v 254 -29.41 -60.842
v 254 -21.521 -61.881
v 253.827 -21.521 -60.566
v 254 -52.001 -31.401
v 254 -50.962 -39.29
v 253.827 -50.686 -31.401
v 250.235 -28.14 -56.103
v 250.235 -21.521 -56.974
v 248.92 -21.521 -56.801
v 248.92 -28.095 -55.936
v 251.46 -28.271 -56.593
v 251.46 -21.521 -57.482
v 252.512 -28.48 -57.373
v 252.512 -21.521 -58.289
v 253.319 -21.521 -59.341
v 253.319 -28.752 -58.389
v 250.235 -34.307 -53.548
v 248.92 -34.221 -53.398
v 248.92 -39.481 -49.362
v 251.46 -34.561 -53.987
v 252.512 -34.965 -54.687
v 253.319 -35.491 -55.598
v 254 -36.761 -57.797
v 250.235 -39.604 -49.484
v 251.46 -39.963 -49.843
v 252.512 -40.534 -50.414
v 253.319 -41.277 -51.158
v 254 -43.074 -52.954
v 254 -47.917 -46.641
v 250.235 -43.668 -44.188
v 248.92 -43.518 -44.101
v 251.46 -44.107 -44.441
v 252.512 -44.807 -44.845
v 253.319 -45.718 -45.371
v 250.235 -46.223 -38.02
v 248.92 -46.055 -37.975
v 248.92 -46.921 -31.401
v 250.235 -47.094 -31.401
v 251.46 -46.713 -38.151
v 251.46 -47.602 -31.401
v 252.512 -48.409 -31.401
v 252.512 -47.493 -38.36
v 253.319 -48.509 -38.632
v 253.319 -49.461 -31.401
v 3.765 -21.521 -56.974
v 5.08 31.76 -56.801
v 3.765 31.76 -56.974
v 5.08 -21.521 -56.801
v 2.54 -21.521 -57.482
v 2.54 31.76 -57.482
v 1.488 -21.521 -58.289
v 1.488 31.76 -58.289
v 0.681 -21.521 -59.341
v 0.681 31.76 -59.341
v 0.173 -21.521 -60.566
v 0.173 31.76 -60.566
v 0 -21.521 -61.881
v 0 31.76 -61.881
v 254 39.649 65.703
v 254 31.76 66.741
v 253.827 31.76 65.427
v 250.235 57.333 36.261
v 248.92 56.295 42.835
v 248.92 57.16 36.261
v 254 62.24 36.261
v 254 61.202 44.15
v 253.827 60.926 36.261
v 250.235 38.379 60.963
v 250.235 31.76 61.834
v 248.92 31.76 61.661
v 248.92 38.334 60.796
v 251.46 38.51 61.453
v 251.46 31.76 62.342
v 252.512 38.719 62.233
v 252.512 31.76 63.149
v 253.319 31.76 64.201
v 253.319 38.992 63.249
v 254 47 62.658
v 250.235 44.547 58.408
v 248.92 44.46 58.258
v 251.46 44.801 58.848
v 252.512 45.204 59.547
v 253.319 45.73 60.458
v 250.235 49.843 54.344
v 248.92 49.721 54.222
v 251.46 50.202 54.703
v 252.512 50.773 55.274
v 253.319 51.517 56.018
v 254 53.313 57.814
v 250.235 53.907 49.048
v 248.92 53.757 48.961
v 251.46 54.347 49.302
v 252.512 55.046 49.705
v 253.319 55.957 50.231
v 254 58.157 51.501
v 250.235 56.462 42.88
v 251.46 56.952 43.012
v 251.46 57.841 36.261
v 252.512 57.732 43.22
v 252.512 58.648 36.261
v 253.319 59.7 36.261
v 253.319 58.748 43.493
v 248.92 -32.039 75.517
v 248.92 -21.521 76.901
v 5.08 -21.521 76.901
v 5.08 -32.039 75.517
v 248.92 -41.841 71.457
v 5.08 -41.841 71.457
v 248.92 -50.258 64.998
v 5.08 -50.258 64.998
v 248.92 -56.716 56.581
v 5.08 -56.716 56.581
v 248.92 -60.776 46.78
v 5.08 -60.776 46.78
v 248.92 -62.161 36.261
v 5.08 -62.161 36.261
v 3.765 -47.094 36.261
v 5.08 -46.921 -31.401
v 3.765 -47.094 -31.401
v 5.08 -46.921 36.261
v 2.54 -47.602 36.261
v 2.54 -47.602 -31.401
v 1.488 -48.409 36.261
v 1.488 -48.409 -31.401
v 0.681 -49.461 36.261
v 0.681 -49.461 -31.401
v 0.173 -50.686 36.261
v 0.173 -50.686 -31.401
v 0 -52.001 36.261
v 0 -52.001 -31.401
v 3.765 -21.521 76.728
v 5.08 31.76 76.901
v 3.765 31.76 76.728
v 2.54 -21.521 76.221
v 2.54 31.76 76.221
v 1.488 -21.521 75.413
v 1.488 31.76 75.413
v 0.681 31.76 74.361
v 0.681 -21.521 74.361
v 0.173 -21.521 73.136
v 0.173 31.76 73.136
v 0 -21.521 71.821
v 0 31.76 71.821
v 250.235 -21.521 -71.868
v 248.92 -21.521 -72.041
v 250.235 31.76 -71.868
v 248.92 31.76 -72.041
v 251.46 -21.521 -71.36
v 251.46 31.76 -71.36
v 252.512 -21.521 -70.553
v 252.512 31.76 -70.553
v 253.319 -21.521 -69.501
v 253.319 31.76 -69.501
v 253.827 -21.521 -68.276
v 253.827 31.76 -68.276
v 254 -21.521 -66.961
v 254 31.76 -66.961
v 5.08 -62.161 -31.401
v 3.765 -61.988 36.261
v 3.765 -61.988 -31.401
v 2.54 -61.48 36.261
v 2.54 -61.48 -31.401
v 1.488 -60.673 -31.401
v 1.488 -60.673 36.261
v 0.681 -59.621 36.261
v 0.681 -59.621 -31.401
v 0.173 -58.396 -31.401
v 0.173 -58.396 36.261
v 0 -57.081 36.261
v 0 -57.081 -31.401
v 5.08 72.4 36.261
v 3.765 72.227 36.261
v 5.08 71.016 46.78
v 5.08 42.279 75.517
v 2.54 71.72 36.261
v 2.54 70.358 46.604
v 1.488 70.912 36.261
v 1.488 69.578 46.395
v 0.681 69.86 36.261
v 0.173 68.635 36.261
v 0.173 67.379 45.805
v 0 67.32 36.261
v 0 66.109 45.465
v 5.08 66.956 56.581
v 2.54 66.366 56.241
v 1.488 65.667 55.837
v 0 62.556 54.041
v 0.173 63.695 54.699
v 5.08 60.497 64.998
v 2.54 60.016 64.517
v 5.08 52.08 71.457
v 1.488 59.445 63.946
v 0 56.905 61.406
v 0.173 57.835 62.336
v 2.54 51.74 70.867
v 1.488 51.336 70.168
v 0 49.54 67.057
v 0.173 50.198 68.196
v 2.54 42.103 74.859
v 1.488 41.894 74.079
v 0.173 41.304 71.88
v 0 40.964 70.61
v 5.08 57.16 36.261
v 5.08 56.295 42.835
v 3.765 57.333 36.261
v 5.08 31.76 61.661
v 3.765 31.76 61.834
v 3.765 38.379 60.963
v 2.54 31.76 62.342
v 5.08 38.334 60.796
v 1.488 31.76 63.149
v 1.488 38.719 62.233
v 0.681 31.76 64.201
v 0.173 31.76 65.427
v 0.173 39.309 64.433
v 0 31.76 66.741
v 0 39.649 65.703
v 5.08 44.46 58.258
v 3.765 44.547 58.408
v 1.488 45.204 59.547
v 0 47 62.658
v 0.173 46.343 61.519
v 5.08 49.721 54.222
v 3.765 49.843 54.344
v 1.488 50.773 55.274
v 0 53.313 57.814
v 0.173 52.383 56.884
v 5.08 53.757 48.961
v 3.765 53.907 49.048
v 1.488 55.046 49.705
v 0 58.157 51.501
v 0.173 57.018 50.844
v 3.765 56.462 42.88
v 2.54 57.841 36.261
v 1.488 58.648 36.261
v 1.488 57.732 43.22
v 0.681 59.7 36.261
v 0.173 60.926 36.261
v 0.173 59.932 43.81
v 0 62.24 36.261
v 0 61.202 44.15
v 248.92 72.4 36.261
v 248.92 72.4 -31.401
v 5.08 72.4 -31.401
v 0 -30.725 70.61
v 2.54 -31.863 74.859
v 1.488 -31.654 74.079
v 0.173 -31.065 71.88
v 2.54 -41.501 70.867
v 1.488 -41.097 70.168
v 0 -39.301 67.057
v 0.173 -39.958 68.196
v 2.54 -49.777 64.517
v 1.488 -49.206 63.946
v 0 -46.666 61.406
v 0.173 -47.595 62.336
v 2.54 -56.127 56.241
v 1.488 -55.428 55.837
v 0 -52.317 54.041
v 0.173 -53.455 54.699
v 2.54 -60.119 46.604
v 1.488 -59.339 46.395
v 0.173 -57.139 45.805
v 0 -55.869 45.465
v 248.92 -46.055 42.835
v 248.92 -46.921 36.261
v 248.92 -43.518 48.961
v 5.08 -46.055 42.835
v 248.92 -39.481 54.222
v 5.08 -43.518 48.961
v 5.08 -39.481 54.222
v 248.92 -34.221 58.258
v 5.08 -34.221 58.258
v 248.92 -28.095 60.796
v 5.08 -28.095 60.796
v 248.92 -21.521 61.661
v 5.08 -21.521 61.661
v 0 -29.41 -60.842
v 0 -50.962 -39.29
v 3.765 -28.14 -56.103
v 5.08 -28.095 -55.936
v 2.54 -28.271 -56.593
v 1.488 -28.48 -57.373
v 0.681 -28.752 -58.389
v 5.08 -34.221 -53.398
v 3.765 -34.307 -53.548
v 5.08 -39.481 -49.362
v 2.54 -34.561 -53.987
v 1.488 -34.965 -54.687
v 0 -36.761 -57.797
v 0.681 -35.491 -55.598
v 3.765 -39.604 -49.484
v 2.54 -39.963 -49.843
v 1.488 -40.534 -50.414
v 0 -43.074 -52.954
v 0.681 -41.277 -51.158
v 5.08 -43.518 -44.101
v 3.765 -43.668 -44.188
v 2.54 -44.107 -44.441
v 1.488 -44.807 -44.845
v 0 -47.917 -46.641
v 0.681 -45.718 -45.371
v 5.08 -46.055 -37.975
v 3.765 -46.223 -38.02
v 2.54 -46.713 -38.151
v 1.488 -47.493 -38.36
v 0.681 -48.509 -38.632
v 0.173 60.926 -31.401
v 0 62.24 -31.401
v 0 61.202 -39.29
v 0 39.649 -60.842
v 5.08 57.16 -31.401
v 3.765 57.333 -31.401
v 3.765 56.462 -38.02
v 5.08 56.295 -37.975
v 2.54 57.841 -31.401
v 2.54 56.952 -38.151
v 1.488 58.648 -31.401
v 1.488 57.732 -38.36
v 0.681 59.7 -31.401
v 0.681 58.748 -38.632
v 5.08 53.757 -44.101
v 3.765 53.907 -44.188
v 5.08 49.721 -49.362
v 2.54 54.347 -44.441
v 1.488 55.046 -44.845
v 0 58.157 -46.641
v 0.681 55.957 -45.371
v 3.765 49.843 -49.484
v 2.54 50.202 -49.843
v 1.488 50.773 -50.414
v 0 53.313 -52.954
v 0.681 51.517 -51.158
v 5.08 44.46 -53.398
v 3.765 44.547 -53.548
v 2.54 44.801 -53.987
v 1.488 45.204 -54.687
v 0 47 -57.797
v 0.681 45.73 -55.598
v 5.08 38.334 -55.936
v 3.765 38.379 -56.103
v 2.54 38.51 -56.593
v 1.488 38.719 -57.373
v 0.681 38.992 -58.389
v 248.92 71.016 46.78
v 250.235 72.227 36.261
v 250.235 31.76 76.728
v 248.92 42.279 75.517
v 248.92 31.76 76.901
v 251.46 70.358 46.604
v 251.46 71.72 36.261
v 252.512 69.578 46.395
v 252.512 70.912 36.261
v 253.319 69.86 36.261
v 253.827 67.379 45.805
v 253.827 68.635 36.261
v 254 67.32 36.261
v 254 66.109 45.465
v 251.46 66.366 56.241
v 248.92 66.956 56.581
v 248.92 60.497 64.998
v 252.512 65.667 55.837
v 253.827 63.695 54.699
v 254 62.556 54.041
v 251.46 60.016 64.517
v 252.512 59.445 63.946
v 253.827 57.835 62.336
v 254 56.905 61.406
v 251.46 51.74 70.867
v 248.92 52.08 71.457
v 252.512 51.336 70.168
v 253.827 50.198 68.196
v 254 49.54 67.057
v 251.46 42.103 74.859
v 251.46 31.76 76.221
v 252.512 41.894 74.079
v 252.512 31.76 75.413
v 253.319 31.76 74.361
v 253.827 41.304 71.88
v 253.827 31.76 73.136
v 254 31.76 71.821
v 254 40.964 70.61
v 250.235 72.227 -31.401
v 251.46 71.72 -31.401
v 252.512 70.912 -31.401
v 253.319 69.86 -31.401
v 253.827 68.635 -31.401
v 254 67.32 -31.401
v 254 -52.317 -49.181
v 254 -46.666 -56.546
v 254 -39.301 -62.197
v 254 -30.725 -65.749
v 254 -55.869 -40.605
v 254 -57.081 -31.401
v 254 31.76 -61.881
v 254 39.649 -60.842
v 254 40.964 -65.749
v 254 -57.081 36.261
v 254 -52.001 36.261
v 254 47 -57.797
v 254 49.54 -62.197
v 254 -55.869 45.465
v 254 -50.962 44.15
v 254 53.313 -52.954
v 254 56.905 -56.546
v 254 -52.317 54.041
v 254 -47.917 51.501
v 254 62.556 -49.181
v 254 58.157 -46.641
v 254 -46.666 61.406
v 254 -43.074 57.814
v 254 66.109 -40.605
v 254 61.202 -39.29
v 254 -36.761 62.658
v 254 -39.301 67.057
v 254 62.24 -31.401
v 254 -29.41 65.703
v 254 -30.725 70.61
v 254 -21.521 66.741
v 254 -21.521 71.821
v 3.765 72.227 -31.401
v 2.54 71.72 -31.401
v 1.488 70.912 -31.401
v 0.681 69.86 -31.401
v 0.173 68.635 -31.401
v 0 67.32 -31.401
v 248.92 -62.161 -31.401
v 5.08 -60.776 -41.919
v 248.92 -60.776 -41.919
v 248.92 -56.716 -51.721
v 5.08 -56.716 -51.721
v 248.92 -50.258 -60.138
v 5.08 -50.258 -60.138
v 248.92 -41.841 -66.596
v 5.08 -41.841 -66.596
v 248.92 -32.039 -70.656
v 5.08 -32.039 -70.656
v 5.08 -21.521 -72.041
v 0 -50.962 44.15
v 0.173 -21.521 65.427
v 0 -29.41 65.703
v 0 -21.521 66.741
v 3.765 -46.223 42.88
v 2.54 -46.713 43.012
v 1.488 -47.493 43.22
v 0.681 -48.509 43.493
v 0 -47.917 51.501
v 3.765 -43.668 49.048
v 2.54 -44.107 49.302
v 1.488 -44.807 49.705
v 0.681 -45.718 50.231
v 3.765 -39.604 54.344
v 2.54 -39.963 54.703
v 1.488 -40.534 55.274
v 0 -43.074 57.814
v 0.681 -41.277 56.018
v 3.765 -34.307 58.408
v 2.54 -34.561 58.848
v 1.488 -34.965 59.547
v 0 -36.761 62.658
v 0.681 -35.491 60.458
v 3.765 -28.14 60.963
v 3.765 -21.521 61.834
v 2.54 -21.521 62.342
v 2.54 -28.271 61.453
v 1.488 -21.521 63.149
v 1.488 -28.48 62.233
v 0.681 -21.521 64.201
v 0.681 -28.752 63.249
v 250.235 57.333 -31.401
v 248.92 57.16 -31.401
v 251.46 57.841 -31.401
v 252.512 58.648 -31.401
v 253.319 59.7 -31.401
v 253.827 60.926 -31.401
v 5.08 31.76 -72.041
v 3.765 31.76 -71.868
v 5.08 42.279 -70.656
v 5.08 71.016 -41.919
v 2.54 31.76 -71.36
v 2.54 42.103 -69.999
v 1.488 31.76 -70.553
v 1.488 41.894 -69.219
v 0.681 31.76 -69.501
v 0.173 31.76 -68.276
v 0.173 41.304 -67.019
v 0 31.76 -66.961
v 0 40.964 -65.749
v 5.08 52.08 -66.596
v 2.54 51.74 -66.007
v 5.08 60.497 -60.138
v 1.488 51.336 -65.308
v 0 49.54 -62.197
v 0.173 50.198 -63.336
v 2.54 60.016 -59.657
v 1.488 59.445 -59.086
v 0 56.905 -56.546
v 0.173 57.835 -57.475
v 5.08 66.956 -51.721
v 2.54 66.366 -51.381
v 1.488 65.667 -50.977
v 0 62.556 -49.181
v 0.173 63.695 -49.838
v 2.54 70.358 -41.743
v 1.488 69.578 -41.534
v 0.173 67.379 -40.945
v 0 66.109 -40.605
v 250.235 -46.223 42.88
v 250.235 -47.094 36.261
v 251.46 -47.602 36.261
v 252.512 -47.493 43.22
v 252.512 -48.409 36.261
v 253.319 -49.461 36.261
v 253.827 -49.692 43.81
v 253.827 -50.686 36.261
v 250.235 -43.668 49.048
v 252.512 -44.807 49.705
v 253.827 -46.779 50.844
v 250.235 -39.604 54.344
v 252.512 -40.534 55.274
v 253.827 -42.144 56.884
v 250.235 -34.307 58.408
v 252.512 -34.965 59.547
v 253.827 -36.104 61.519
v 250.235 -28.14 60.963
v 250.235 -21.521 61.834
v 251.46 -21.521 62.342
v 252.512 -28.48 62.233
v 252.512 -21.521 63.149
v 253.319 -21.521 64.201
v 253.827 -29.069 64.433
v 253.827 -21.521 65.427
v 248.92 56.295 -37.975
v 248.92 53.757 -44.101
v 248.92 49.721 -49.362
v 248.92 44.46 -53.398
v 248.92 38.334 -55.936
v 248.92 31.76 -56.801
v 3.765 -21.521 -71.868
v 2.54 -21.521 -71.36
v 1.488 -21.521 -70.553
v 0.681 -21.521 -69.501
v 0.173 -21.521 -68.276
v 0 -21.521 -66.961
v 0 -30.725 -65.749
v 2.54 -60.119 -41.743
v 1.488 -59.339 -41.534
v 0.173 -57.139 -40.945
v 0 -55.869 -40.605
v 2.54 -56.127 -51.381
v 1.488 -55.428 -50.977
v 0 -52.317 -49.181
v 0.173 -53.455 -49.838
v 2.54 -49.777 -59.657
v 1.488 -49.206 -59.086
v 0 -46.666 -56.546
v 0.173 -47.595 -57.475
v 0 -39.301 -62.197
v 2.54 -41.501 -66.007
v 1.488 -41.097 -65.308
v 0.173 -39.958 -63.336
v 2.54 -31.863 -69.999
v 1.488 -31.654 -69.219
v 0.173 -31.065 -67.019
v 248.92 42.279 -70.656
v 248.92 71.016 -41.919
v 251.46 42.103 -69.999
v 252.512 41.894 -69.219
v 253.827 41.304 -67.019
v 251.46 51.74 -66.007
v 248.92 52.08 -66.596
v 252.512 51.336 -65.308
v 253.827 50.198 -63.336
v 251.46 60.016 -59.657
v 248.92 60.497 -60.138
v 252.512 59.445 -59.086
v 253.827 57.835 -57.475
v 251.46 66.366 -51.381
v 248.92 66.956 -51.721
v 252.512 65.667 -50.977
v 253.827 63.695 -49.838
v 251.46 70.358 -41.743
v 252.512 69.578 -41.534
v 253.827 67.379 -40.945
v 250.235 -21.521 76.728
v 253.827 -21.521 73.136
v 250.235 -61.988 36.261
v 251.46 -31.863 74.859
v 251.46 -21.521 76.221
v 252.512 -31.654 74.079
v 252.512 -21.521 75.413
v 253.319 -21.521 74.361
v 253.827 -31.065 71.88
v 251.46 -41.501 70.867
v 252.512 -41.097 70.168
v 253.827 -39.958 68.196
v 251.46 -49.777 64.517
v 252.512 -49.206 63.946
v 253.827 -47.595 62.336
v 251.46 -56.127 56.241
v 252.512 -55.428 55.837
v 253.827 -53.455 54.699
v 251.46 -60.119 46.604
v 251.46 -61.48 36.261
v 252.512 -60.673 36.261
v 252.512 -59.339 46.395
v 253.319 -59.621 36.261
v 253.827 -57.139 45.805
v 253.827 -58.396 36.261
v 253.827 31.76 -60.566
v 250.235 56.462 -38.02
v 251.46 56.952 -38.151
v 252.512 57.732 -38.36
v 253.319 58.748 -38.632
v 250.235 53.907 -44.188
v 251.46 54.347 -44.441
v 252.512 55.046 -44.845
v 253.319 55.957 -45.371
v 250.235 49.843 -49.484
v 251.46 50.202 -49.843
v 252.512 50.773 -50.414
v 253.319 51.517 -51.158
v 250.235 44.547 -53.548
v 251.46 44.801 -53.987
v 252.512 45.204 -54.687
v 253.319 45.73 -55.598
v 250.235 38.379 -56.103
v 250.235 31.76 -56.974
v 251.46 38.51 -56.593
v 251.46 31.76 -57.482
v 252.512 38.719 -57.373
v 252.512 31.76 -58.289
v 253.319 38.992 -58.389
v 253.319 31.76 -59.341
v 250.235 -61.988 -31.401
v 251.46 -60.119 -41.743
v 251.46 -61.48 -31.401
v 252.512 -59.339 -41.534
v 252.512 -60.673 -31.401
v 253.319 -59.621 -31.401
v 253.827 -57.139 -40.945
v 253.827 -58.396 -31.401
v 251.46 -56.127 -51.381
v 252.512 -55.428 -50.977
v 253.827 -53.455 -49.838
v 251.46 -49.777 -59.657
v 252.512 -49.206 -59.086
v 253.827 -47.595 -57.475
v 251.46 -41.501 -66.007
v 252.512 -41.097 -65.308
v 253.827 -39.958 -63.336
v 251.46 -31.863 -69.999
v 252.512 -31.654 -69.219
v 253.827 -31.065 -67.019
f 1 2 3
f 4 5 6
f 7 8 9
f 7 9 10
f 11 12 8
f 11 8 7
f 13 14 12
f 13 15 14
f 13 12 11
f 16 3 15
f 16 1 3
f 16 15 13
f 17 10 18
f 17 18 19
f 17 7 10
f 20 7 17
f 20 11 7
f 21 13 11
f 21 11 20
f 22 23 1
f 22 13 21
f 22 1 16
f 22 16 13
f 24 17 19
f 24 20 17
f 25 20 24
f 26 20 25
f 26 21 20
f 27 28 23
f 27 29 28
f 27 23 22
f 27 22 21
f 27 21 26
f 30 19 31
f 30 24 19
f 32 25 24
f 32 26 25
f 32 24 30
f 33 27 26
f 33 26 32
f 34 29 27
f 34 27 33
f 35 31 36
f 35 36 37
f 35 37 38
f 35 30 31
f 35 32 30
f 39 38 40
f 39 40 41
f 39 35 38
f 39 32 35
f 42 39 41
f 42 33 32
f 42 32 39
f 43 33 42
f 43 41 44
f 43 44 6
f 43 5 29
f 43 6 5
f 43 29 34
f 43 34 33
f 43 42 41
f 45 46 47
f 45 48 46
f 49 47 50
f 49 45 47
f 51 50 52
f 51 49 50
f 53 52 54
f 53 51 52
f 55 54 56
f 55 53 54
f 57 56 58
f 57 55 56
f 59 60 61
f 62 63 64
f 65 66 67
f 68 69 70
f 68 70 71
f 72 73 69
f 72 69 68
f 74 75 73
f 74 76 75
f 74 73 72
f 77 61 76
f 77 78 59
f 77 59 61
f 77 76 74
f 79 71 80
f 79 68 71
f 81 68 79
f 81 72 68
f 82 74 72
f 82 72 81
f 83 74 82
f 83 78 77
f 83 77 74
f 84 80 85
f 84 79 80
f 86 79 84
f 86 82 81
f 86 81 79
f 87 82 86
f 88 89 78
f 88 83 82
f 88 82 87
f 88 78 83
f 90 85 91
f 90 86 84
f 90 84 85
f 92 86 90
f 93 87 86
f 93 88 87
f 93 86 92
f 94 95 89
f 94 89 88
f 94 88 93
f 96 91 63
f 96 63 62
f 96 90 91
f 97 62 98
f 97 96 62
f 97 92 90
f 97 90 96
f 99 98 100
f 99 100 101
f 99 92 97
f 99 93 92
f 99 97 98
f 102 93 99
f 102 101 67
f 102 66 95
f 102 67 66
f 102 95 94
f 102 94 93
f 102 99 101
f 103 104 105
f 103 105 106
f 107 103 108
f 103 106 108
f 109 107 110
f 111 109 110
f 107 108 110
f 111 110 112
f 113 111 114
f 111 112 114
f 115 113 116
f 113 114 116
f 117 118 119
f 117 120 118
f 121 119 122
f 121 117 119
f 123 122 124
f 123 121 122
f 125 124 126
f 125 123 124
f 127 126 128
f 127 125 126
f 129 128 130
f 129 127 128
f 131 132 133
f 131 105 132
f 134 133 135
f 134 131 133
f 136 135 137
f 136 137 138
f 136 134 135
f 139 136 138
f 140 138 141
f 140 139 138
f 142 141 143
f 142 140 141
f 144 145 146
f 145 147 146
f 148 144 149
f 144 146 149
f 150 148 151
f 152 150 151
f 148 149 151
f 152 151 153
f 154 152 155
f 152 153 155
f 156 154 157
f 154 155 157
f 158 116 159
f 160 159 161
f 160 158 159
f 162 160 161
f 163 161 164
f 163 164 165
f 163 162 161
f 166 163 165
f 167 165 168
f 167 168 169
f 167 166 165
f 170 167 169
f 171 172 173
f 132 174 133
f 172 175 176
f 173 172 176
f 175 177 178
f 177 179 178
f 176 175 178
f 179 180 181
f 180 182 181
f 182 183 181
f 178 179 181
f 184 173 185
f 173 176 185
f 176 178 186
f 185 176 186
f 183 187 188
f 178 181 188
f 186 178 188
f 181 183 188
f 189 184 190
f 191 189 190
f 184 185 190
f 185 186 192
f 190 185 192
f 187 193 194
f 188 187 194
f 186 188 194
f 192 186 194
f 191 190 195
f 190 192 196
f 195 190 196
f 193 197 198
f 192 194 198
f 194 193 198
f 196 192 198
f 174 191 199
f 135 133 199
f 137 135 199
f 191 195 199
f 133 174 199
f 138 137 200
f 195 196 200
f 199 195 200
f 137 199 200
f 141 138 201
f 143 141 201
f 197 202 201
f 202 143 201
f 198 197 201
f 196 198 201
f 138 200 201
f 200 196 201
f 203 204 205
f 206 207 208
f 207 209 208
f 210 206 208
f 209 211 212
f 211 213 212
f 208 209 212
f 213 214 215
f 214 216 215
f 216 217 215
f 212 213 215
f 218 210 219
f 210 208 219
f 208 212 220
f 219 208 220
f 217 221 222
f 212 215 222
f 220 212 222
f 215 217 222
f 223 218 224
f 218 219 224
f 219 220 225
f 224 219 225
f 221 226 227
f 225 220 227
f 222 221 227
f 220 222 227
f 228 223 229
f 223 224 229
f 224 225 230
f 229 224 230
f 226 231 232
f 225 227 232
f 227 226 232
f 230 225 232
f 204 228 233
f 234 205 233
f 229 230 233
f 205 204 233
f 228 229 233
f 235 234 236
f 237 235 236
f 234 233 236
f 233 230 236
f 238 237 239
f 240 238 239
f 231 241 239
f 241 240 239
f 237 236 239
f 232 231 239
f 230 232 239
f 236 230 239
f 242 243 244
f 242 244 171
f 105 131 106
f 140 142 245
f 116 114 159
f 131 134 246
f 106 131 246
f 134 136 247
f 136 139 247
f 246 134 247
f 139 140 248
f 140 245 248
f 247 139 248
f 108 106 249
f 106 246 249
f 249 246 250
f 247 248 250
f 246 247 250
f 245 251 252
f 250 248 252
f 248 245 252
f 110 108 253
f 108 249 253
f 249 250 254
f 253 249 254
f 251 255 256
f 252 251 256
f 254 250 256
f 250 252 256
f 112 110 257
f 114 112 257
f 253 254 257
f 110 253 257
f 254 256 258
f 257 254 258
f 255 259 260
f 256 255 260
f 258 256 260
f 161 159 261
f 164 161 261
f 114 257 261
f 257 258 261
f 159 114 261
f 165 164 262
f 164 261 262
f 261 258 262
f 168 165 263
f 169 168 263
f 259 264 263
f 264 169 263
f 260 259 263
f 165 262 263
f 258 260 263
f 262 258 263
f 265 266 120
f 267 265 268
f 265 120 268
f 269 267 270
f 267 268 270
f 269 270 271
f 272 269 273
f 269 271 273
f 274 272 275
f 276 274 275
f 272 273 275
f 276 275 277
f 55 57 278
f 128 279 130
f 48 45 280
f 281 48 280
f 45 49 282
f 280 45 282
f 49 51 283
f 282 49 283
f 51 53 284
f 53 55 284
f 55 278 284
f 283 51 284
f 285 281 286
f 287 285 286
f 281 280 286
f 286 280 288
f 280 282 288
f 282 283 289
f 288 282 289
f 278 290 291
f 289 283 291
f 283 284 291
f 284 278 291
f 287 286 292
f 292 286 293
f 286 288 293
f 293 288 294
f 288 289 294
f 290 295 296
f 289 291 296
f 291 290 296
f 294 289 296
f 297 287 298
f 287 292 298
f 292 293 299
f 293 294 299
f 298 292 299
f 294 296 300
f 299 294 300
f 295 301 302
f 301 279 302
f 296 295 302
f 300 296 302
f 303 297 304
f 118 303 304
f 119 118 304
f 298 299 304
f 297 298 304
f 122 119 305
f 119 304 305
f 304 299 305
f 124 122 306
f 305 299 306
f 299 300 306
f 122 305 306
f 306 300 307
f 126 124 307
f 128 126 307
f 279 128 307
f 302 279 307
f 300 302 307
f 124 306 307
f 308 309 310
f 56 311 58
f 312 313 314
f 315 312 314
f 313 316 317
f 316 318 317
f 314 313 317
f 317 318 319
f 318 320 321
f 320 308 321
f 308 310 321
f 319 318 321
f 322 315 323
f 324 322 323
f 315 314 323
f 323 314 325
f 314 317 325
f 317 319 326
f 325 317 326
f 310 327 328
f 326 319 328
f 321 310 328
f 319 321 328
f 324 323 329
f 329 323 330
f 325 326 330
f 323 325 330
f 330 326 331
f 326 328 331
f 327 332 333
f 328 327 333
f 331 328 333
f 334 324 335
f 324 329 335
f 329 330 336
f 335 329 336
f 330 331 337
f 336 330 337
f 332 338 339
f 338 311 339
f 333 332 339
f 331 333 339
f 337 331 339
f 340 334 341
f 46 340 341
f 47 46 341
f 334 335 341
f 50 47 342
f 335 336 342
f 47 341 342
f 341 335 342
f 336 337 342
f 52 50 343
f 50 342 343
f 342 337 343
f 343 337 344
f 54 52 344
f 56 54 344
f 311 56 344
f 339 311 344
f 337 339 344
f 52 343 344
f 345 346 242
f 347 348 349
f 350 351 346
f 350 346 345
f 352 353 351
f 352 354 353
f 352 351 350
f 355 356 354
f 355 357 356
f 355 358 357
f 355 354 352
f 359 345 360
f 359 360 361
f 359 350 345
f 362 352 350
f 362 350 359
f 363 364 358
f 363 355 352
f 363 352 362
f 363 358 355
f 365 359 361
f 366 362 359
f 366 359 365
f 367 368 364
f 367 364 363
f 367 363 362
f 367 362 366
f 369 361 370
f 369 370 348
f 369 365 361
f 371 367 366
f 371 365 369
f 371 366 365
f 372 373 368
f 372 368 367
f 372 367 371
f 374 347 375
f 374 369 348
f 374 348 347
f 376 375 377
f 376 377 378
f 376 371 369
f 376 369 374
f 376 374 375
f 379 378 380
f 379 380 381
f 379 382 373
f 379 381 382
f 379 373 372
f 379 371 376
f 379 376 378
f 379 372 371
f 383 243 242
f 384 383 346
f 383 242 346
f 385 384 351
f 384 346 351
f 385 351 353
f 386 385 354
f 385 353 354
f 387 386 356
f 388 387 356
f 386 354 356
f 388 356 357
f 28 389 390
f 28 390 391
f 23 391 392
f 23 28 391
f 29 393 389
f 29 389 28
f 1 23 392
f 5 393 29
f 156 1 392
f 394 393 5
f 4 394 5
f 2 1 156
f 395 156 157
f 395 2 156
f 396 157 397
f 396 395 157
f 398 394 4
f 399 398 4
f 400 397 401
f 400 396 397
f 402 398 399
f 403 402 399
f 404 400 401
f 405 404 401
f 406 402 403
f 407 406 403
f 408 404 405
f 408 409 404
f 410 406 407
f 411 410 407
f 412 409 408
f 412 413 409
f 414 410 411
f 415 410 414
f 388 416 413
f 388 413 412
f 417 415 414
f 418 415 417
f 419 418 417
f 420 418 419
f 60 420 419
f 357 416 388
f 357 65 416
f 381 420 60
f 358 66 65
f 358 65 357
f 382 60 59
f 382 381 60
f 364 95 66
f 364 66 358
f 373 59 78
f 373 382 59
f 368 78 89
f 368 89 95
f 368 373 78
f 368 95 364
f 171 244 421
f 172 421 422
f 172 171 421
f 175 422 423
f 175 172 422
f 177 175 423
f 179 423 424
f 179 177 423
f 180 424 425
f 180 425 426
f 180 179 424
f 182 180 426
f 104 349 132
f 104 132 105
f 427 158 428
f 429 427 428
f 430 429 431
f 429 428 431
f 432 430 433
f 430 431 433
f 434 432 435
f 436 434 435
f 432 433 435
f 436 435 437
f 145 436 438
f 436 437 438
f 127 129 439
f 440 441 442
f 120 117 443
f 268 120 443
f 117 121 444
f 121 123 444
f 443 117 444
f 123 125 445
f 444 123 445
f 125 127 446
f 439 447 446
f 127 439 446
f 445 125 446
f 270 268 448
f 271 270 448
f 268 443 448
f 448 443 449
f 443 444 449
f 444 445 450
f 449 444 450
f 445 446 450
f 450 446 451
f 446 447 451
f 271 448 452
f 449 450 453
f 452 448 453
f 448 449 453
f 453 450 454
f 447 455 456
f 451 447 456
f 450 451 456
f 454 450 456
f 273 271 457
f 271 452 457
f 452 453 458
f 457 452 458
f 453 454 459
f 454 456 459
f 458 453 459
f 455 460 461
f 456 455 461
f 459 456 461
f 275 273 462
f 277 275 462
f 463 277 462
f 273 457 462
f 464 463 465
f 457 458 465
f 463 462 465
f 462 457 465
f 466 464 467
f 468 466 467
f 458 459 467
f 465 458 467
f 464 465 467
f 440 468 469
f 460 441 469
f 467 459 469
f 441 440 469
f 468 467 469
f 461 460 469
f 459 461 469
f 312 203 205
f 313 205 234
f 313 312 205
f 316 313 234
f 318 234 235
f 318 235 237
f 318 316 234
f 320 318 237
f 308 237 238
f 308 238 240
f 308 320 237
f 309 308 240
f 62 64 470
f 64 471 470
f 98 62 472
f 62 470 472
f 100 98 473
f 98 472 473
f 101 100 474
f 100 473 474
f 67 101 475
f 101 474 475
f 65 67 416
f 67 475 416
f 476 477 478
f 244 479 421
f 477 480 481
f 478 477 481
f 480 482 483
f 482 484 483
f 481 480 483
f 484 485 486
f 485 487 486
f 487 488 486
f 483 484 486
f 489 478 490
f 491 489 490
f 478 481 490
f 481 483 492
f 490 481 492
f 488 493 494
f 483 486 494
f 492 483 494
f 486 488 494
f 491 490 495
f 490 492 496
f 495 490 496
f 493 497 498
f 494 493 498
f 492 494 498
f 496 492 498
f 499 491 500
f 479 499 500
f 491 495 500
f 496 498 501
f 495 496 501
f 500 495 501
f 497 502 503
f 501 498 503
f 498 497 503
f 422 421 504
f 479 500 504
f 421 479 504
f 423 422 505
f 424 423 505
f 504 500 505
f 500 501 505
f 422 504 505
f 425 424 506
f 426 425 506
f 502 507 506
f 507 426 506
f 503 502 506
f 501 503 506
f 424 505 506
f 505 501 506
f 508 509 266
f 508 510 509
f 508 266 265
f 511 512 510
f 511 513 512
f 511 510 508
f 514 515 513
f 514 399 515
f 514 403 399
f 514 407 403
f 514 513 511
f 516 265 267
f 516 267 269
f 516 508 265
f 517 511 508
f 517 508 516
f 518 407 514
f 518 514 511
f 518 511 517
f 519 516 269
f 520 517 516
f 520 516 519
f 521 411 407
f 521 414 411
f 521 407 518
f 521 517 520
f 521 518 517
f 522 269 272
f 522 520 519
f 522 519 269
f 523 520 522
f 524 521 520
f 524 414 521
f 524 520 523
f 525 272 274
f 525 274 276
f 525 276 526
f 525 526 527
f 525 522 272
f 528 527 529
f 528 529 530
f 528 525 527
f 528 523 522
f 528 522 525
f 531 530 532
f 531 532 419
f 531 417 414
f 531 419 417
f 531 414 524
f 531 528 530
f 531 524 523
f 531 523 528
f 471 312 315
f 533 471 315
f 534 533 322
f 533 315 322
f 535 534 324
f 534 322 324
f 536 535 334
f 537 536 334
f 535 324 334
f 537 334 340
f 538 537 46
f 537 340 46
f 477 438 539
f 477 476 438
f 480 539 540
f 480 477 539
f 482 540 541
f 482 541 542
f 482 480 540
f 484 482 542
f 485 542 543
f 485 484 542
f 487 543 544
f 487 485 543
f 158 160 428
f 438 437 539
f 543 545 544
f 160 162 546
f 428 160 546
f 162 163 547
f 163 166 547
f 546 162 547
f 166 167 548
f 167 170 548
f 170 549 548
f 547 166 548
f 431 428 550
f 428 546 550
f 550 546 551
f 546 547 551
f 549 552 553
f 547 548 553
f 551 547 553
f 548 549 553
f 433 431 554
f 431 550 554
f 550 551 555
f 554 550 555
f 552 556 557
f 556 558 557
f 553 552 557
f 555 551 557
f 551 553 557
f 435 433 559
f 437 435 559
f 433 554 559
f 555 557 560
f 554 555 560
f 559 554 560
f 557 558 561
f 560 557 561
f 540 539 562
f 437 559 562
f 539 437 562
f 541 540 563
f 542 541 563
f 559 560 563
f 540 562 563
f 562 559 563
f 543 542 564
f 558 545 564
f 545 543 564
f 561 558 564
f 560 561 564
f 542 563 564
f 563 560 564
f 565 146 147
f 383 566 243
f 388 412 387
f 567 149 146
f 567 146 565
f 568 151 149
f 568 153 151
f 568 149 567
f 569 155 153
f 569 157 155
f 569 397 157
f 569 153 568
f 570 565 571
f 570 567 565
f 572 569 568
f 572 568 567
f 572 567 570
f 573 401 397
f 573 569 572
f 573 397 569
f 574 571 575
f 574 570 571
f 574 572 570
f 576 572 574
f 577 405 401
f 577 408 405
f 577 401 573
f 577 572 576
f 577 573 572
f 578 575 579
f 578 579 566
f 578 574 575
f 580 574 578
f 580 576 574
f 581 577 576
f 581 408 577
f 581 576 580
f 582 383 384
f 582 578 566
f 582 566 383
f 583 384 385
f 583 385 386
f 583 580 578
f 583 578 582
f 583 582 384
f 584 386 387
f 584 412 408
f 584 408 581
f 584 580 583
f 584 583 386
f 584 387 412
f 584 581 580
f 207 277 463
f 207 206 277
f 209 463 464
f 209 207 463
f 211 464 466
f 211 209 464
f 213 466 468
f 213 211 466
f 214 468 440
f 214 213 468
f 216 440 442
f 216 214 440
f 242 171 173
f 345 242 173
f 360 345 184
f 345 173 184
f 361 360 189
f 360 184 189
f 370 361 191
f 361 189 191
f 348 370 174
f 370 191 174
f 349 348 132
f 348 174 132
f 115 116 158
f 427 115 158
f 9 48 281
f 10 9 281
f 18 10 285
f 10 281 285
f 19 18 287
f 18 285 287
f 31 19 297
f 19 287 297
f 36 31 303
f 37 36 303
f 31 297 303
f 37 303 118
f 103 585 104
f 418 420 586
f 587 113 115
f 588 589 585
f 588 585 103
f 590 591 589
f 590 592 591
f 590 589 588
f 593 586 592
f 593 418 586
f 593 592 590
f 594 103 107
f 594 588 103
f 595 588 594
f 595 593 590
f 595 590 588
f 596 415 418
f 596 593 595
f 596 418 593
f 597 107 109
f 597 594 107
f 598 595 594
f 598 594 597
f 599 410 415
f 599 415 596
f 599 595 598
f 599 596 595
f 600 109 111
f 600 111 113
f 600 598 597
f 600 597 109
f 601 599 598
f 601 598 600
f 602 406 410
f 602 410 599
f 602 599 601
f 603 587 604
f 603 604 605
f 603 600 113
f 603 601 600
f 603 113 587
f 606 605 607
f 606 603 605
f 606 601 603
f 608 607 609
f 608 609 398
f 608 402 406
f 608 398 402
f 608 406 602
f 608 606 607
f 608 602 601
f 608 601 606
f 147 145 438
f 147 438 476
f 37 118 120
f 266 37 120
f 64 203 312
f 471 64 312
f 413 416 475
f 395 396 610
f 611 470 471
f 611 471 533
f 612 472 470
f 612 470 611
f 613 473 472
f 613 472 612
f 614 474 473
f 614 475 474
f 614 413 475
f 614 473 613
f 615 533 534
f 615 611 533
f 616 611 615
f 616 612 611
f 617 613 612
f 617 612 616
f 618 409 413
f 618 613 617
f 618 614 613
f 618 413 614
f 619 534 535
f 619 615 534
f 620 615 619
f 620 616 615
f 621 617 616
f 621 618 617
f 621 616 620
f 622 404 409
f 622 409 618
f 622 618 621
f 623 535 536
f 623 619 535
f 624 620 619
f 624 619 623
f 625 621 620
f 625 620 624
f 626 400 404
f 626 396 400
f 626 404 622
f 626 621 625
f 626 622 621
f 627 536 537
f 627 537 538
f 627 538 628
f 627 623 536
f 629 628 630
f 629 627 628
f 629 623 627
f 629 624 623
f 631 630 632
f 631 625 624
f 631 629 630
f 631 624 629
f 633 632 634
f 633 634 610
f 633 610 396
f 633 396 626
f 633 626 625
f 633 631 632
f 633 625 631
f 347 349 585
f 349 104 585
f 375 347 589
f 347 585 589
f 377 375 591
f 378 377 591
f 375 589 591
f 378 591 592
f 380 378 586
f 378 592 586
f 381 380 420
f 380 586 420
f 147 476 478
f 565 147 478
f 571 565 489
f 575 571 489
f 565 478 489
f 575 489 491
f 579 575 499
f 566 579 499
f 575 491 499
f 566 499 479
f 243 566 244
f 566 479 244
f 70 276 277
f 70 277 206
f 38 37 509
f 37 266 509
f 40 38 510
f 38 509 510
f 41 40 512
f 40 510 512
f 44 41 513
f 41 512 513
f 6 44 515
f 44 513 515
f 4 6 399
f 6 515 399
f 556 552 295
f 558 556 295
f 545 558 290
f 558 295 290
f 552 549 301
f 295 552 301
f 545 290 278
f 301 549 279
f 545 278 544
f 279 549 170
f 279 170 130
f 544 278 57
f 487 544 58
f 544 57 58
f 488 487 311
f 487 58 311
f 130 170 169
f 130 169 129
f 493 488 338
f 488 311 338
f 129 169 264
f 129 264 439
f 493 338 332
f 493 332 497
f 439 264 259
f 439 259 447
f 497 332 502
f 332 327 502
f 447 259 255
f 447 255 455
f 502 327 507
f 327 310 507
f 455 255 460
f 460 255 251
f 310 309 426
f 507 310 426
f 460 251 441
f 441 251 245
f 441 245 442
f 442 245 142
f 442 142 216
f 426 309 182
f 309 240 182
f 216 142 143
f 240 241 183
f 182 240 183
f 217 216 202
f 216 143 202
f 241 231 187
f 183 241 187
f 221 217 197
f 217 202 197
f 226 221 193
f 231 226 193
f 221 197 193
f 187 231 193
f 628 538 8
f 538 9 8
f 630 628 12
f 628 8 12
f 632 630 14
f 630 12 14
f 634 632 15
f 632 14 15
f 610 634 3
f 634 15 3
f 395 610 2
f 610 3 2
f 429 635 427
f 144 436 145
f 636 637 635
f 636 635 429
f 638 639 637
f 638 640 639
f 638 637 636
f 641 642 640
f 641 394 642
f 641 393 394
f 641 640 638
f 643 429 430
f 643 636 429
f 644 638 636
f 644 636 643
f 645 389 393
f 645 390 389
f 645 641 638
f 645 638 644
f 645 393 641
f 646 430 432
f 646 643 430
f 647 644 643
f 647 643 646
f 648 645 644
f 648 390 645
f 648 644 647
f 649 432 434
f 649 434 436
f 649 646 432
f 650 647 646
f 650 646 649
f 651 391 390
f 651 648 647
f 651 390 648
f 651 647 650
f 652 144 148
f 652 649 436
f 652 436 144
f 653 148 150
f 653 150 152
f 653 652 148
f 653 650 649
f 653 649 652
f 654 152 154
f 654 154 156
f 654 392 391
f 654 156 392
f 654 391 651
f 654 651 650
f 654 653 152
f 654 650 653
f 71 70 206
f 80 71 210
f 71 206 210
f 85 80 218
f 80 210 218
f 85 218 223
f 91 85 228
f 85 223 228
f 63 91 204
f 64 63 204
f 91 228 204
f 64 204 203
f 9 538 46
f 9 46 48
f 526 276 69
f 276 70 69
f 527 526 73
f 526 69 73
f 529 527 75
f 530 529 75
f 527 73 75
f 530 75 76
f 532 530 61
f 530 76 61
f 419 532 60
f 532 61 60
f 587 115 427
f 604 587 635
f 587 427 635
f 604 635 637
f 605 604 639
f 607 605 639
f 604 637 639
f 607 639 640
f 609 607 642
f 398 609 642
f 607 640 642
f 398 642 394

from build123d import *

# Parameters (mm, degrees)
F1_DEPTH = 254
F2_R     = 5.08


with BuildPart() as f1:
    # F0 (on Right) → F1 (new body)
    with BuildSketch(Plane.YZ):
        with BuildLine():
            Line((72.400342, -31.400991), (72.400342, 36.261361))
            ThreePointArc((72.400342, 36.261361), (60.497162, 64.99818), (31.760342, 76.901361))
            Line((31.760342, 76.901361), (-21.520933, 76.901361))
            ThreePointArc((-21.520933, 76.901361), (-50.257752, 64.99818), (-62.160933, 36.261361))
            Line((-62.160933, 36.261361), (-62.160933, -31.400991))
            ThreePointArc((-62.160933, -31.400991), (-50.257752, -60.137811), (-21.520933, -72.040991))
            Line((-21.520933, -72.040991), (31.760342, -72.040991))
            ThreePointArc((31.760342, -72.040991), (60.497162, -60.137811), (72.400342, -31.400991))
        make_face()
        with BuildLine():
            ThreePointArc((-46.920933, 36.261361), (-39.481445, 54.221873), (-21.520933, 61.661361))
            Line((-21.520933, 61.661361), (31.760342, 61.661361))
            ThreePointArc((31.760342, 61.661361), (49.720854, 54.221873), (57.160342, 36.261361))
            Line((57.160342, 36.261361), (57.160342, -31.400991))
            ThreePointArc((57.160342, -31.400991), (49.720854, -49.361504), (31.760342, -56.800991))
            Line((31.760342, -56.800991), (-21.520933, -56.800991))
            ThreePointArc((-21.520933, -56.800991), (-39.481445, -49.361504), (-46.920933, -31.400991))
            Line((-46.920933, -31.400991), (-46.920933, 36.261361))
        make_face(mode=Mode.SUBTRACT)
    extrude(amount=F1_DEPTH)

    # F2
    f2_edges = [f1.edges().sort_by_distance(p)[0] for p in [
        (254, 5.119705, 61.661361),
        (254, 5.119705, 76.901361),
        (254, 60.497162, 64.99818),
        (254, 49.720854, 54.221873),
        (254, 57.160342, 2.430185),
        (254, 60.497162, -60.137811),
        (254, 49.720854, -49.361504),
        (254, 72.400342, 2.430185),
        (254, 5.119705, -56.800991),
        (254, 5.119705, -72.040991),
        (254, -39.481445, -49.361504),
        (254, -50.257752, -60.137811),
        (254, -62.160933, 2.430185),
        (254, -46.920933, 2.430185),
        (254, -50.257752, 64.99818),
        (254, -39.481445, 54.221873),
        (0, 72.400342, 2.430185),
        (0, 57.160342, 2.430185),
        (0, 60.497162, 64.99818),
        (0, 5.119705, 61.661361),
        (0, 49.720854, 54.221873),
        (0, 5.119705, 76.901361),
        (0, -50.257752, 64.99818),
        (0, -39.481445, 54.221873),
        (0, -46.920933, 2.430185),
        (0, -62.160933, 2.430185),
        (0, -50.257752, -60.137811),
        (0, -39.481445, -49.361504),
        (0, 5.119705, -72.040991),
        (0, 5.119705, -56.800991),
        (0, 60.497162, -60.137811),
        (0, 49.720854, -49.361504),
    ]]
    fillet(f2_edges, radius=F2_R)


solid = f1.part
